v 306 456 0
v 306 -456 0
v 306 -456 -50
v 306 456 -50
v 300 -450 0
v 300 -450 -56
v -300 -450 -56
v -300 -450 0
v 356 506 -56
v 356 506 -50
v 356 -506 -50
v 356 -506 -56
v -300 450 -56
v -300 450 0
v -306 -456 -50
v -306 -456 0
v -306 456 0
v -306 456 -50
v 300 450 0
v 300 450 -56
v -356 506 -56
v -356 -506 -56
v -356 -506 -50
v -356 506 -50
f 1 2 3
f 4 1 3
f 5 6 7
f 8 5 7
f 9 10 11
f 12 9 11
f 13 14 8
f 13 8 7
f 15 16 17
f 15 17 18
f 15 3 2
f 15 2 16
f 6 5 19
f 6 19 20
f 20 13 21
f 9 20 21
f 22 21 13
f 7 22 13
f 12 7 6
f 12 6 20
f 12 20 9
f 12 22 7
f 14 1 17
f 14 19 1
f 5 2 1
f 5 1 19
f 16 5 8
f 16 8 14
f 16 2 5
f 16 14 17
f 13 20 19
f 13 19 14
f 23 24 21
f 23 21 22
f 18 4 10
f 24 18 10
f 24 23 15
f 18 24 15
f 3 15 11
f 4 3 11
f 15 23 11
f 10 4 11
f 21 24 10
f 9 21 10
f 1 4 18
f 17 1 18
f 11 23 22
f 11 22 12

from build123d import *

# Parameters (mm, degrees)
SKETCH048_W            = 600
SKETCH048_H            = 60
PAD003_DEPTH           = 450
SKETCH049_W            = 612
SKETCH049_H            = 50
PAD010_DEPTH           = 456
SKETCH050_W            = 712
SKETCH050_H            = 1012
PAD011_DEPTH           = 6
CUT001_PLACEMENT_ANGLE = 180


with BuildPart() as body002:
    # Sketch048 → Pad003 (new body, symmetric)
    with BuildSketch(Plane.XZ):
        with Locations((0, 30)):
            Rectangle(SKETCH048_W, SKETCH048_H)
    extrude(amount=PAD003_DEPTH, both=True)


with BuildPart() as cut001:
    # Sketch049 → Pad010 (new body, symmetric)
    with BuildSketch(Plane.XZ):
        with Locations((0, 25)):
            Rectangle(SKETCH049_W, SKETCH049_H)
    extrude(amount=PAD010_DEPTH, both=True)

    # Sketch050 (on Face3 of Pad010) → Pad011 (join)
    with BuildSketch(Plane(origin=(0, 0, 50), x_dir=(-1, 0, 0), z_dir=(0, 0, 1))):
        Rectangle(SKETCH050_W, SKETCH050_H)
    extrude(amount=PAD011_DEPTH)

    # Cut001: cut Body002
    add(body002.part, mode=Mode.SUBTRACT)


with BuildPart() as cut001_1:
    # Cut001 placement: moved
    add(cut001.part.rotate(Axis((0, 0, 0), (0, 1, 0)), CUT001_PLACEMENT_ANGLE))


solid = cut001_1.part
